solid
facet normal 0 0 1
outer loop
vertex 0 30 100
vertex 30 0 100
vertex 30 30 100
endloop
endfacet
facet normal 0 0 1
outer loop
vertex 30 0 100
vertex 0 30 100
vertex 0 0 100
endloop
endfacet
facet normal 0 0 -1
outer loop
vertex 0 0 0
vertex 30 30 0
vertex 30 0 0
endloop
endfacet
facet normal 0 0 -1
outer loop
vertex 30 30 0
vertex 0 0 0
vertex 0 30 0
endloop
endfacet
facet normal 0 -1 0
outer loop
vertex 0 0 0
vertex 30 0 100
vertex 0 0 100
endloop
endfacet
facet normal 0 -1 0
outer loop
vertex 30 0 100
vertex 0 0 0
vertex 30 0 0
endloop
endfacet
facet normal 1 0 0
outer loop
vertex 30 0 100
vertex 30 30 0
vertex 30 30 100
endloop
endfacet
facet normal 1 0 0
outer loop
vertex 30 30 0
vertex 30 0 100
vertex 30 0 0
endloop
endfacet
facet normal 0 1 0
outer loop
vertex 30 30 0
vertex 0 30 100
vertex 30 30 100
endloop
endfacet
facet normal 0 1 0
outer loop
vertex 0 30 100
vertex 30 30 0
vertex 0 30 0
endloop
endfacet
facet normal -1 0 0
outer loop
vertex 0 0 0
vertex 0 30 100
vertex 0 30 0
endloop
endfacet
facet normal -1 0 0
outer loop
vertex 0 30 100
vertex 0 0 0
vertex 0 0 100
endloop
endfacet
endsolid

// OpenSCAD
$fn = 64;

length = 100;
size = 30;

color([0.75, 0.78, 0.82])
cube([size, size, length], center=false);
